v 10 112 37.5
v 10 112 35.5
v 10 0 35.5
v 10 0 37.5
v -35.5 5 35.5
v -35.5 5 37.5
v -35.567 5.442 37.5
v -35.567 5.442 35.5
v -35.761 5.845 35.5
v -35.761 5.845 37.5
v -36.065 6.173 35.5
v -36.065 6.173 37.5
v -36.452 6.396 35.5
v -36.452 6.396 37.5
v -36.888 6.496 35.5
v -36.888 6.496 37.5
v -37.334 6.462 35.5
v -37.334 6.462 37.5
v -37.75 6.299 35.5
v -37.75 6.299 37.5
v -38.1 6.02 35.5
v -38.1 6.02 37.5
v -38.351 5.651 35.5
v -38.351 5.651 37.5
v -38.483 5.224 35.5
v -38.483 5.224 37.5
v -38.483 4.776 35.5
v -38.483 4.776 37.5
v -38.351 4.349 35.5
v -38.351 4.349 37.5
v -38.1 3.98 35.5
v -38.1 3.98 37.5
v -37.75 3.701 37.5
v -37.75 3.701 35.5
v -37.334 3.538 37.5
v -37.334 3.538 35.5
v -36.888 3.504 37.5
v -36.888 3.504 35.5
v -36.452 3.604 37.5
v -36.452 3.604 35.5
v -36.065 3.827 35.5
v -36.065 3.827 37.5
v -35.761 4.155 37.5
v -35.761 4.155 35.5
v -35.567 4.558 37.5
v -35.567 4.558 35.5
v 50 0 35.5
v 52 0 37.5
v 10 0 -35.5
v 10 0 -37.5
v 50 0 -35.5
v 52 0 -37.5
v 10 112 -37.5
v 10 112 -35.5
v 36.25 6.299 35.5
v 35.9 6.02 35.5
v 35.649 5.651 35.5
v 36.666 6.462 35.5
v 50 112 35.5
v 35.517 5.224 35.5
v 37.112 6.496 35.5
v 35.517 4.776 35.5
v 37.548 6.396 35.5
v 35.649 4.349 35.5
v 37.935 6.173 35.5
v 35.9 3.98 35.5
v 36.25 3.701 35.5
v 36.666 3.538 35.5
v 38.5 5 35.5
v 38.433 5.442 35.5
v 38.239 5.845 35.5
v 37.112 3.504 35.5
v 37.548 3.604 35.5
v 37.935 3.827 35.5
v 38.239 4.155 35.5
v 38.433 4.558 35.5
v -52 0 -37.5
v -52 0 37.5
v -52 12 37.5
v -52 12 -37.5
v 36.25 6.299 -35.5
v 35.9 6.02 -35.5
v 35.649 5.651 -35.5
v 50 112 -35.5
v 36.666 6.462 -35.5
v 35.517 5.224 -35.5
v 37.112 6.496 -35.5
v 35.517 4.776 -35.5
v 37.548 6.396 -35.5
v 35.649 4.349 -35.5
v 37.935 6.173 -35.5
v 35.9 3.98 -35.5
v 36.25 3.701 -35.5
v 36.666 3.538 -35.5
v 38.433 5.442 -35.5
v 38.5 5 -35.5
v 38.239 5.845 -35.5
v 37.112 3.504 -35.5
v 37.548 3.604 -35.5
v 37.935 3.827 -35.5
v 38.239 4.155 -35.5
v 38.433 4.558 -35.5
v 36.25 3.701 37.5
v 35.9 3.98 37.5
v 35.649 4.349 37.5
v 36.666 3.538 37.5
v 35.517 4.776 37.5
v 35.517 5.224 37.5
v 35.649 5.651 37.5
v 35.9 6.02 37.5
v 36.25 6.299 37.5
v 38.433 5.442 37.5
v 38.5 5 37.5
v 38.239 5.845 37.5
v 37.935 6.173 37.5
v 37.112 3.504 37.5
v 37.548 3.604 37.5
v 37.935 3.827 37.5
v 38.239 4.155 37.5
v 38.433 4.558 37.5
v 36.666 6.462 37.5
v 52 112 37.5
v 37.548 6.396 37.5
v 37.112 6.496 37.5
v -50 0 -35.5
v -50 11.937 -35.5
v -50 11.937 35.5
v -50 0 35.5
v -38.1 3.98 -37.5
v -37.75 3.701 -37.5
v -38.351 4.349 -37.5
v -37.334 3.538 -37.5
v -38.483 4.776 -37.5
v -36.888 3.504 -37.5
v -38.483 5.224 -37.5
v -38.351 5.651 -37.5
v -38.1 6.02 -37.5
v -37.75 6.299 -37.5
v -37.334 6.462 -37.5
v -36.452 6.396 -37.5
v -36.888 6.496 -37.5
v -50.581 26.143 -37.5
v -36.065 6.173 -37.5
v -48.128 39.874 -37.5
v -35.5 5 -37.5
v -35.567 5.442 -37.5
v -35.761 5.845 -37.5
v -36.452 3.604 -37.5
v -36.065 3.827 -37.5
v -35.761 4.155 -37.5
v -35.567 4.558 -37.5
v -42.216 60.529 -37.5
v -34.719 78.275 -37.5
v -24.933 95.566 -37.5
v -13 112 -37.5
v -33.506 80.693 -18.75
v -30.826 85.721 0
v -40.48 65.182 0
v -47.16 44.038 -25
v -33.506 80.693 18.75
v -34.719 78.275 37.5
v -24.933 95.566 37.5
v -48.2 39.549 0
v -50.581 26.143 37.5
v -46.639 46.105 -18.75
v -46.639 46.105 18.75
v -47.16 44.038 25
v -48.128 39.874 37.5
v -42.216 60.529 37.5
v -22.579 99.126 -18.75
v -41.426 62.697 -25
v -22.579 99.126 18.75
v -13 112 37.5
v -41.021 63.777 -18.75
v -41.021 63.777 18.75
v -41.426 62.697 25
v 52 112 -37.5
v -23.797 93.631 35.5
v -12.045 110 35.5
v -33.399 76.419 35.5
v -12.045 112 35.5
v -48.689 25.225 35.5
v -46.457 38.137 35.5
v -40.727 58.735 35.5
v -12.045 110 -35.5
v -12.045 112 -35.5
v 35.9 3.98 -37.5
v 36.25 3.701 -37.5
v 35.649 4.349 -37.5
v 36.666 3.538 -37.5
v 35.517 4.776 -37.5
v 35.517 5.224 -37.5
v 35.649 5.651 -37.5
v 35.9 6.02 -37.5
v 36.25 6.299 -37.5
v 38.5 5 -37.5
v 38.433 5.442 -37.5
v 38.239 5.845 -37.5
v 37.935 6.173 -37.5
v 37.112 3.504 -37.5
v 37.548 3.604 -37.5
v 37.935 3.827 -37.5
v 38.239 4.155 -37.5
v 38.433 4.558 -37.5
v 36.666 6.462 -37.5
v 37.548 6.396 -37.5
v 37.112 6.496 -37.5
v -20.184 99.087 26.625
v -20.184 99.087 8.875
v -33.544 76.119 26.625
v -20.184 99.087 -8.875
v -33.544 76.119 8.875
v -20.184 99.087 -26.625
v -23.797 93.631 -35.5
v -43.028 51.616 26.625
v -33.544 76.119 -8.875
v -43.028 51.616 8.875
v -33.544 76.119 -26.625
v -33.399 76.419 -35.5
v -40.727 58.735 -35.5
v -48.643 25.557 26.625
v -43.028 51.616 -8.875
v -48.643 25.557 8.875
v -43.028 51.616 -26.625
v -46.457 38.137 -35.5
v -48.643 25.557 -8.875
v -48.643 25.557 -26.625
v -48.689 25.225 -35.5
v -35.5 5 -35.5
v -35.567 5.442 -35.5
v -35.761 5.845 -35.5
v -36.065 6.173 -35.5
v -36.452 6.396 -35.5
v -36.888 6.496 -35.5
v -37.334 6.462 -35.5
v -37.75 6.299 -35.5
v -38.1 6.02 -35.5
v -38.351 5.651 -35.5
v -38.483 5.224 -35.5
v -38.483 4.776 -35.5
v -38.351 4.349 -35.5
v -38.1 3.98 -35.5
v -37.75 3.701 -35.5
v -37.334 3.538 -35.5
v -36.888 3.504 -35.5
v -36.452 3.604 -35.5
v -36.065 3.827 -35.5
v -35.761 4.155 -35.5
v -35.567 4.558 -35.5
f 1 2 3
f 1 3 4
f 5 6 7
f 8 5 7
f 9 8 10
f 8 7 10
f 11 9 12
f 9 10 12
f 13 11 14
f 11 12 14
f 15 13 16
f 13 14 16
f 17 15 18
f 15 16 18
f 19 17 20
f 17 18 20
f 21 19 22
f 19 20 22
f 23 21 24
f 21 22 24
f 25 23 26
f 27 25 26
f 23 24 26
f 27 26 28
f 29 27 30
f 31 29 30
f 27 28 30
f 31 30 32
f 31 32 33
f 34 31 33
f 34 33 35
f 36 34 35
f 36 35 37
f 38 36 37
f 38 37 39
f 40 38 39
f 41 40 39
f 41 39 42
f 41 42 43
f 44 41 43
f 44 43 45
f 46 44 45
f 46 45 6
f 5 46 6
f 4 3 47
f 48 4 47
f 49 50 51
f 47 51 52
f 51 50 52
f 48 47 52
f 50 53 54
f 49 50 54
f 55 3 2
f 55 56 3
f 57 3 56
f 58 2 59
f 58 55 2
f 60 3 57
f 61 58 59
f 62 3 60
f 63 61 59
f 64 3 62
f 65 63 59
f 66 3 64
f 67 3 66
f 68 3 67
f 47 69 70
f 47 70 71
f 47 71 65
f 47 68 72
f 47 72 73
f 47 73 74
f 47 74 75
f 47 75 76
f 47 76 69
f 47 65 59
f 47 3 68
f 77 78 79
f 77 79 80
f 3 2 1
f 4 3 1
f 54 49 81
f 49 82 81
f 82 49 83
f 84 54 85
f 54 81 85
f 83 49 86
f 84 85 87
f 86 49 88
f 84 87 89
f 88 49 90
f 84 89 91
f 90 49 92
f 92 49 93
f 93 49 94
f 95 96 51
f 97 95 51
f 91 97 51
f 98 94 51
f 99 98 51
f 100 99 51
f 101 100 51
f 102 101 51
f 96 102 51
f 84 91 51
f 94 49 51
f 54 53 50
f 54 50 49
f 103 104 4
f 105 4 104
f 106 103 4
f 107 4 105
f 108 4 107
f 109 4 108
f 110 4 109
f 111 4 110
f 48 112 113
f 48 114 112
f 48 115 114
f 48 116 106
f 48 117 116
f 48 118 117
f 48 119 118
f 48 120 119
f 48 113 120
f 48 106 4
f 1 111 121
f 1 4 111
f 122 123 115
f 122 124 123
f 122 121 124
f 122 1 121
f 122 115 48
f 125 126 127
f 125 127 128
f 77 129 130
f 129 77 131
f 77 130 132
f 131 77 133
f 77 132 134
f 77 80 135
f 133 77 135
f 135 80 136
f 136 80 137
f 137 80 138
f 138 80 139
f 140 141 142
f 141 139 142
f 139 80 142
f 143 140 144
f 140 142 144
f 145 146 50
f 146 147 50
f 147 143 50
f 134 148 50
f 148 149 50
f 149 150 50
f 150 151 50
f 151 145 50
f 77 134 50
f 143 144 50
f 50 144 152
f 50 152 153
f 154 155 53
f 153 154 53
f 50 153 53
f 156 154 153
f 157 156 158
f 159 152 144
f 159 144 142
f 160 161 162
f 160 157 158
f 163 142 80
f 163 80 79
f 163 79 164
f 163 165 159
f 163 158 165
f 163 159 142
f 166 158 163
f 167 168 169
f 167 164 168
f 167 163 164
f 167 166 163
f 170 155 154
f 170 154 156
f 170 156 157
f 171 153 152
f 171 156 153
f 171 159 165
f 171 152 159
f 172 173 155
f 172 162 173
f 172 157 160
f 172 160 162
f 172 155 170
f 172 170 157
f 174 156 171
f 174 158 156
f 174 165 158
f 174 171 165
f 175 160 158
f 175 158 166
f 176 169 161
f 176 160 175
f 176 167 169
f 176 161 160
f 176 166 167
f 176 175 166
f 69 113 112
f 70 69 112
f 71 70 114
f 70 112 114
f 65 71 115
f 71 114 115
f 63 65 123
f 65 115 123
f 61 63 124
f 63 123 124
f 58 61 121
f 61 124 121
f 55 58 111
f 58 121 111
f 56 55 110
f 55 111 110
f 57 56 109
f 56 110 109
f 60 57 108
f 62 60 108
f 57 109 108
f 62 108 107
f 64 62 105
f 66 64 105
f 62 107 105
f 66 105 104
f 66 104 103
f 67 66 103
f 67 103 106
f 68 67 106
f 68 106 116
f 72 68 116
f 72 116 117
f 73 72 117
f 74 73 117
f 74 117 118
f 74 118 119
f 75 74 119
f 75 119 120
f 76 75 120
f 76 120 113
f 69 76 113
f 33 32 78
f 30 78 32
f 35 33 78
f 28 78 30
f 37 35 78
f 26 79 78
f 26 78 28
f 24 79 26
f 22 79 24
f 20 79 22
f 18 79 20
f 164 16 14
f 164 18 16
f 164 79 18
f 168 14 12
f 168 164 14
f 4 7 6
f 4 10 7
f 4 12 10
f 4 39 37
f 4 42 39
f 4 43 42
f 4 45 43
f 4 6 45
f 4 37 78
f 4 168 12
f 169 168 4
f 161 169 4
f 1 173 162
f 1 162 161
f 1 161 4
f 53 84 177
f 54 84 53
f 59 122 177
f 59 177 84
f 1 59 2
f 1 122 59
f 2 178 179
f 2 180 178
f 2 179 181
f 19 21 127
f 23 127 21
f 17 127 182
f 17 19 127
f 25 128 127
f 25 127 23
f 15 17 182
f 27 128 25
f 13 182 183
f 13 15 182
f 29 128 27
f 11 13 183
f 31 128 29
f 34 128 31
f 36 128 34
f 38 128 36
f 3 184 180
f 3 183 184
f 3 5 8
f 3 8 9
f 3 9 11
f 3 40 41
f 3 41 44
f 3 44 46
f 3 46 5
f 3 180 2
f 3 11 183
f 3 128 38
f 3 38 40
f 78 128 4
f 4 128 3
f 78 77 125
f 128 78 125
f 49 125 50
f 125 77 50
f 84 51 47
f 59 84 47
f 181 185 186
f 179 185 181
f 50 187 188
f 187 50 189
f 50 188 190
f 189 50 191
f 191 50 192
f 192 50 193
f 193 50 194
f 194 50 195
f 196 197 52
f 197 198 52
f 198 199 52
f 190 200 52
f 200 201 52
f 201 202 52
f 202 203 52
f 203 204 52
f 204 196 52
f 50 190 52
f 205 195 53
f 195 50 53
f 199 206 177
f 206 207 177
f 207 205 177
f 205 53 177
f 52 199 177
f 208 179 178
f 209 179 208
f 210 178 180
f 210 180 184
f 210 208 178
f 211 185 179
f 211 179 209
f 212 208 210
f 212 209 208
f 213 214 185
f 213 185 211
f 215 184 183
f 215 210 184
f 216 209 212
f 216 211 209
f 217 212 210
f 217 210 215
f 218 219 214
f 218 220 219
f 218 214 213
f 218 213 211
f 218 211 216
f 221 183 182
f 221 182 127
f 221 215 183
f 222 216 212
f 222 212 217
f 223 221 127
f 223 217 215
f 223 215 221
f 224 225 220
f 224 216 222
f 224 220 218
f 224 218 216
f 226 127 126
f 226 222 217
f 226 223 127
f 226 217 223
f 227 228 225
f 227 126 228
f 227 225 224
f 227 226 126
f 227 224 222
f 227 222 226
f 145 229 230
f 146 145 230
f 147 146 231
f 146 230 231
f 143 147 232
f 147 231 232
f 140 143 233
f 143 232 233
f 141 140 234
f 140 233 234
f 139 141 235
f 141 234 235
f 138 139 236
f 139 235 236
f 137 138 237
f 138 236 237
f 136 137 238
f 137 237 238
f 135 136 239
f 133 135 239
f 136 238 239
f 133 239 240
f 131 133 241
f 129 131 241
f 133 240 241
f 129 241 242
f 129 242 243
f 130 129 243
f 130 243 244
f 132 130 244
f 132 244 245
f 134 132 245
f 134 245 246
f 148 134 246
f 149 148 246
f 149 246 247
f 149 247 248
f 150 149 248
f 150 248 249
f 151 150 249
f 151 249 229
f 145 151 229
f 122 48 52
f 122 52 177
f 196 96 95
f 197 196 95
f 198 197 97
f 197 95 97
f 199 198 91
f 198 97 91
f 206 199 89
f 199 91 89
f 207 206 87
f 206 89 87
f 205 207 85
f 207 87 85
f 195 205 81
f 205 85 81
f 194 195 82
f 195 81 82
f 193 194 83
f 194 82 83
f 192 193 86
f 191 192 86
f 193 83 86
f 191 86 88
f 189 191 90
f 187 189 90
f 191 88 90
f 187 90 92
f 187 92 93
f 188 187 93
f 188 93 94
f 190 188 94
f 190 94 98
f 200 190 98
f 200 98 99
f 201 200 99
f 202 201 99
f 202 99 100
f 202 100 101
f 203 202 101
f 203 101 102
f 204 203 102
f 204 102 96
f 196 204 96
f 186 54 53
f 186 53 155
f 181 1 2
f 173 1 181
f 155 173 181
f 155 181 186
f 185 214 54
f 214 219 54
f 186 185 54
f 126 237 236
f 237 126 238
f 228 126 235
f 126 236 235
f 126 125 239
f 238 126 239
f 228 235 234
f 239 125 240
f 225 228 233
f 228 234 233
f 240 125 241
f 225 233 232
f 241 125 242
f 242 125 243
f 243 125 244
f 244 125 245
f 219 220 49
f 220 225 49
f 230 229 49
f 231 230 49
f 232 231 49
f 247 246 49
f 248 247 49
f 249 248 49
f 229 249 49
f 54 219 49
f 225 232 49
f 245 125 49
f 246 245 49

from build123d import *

# Parameters (mm, degrees)
SKETCH1_W           = 104
SKETCH1_H           = 75
BOSS_EXTRUDE2_DEPTH = 12
BOSS_EXTRUDE4_DEPTH = 75
SHELL1_START        = -35.5
SHELL1_DEPTH        = 71
SKETCH3_W           = 62.04509354
SKETCH3_H           = 71
CUT_EXTRUDE1_DEPTH  = 128.319480206
SKETCH4_R           = 1.5
CUT_EXTRUDE2_DEPTH  = 145.474911482


# Read off the part's stored shape, not the designer's step: Shell1
with BuildPart() as part:
    # Sketch1 → Boss-Extrude2 (new body)
    with BuildSketch(Plane(origin=(0, 0, 0), x_dir=(1, 0, 0), z_dir=(0, 1, 0))):
        Rectangle(SKETCH1_W, SKETCH1_H)
    extrude(amount=BOSS_EXTRUDE2_DEPTH)

    # Sketch2 → Boss-Extrude4 (add)
    with BuildSketch(Plane.XY.offset(37.5)):
        with BuildLine():
            Line((52, 12), (52, 112))
            Line((52, 112), (-13, 112))
            add(Edge.make_bspline(
                [(-13, 112), (-48.459809771, 68.363449042), (-52, 12)],
                knots=[0, 0, 0, 1, 1, 1], degree=2))
            Line((-52, 12), (52, 12))
        make_face()
    extrude(amount=-BOSS_EXTRUDE4_DEPTH)

    # Shell1 outline → Shell1 (cut)
    with BuildSketch(Plane.XY.offset(SHELL1_START)):
        with BuildLine():
            Line((50, 110), (-12.045093537, 110.000000006))
            add(Edge.make_bspline(
                [(-12.045093537, 110.000000006), (-20.670956306, 99.276173698), (-28.182222953, 88.11932571), (-34.582341912, 76.528575232), (-39.874973944, 64.50158541), (-44.063442169, 52.033775923), (-47.148080274, 39.119568406), (-49.127608799, 25.754940937), (-50, 11.937090173)],
                knots=[0.008542591, 0.008542591, 0.008542591, 0.008542591, 0.008542591, 0.008542591, 0.008542591, 0.008542591, 0.008542591, 0.999440121, 0.999440121, 0.999440121, 0.999440121, 0.999440121, 0.999440121, 0.999440121, 0.999440121, 0.999440121], degree=8))
            Line((-50, 11.937090173), (-50, 0))
            Line((-50, 0), (50, 0))
            Line((50, 0), (50, 110))
        make_face()
    extrude(amount=SHELL1_DEPTH, mode=Mode.SUBTRACT)

    # Sketch3 → Cut-Extrude1 (cut, through all)
    with BuildSketch(Plane.XZ.offset(-110)):
        with Locations((18.97745323, 0)):
            Rectangle(SKETCH3_W, SKETCH3_H)
    extrude(amount=-CUT_EXTRUDE1_DEPTH, mode=Mode.SUBTRACT)

    # Sketch4 → Cut-Extrude2 (cut, through all)
    with BuildSketch(Plane.XY.offset(37.5)):
        with Locations((-37, 5)):
            Circle(SKETCH4_R)
        with Locations((37, 5)):
            Circle(SKETCH4_R)
    extrude(amount=-CUT_EXTRUDE2_DEPTH, mode=Mode.SUBTRACT)


with BuildPart() as body_2:
    # Split1: the piece on the far side of the plane
    add(part.part)
    split(bisect_by=Plane(origin=(10, 0, 0), x_dir=(0, 0, 1), z_dir=(1, 0, 0)), keep=Keep.BOTTOM)


with BuildPart() as part_1:
    add(part.part)

    # Split1
    split(bisect_by=Plane(origin=(10, 0, 0), x_dir=(0, 0, 1), z_dir=(1, 0, 0)), keep=Keep.TOP)


solid = Compound([body_2.part, part_1.part])
